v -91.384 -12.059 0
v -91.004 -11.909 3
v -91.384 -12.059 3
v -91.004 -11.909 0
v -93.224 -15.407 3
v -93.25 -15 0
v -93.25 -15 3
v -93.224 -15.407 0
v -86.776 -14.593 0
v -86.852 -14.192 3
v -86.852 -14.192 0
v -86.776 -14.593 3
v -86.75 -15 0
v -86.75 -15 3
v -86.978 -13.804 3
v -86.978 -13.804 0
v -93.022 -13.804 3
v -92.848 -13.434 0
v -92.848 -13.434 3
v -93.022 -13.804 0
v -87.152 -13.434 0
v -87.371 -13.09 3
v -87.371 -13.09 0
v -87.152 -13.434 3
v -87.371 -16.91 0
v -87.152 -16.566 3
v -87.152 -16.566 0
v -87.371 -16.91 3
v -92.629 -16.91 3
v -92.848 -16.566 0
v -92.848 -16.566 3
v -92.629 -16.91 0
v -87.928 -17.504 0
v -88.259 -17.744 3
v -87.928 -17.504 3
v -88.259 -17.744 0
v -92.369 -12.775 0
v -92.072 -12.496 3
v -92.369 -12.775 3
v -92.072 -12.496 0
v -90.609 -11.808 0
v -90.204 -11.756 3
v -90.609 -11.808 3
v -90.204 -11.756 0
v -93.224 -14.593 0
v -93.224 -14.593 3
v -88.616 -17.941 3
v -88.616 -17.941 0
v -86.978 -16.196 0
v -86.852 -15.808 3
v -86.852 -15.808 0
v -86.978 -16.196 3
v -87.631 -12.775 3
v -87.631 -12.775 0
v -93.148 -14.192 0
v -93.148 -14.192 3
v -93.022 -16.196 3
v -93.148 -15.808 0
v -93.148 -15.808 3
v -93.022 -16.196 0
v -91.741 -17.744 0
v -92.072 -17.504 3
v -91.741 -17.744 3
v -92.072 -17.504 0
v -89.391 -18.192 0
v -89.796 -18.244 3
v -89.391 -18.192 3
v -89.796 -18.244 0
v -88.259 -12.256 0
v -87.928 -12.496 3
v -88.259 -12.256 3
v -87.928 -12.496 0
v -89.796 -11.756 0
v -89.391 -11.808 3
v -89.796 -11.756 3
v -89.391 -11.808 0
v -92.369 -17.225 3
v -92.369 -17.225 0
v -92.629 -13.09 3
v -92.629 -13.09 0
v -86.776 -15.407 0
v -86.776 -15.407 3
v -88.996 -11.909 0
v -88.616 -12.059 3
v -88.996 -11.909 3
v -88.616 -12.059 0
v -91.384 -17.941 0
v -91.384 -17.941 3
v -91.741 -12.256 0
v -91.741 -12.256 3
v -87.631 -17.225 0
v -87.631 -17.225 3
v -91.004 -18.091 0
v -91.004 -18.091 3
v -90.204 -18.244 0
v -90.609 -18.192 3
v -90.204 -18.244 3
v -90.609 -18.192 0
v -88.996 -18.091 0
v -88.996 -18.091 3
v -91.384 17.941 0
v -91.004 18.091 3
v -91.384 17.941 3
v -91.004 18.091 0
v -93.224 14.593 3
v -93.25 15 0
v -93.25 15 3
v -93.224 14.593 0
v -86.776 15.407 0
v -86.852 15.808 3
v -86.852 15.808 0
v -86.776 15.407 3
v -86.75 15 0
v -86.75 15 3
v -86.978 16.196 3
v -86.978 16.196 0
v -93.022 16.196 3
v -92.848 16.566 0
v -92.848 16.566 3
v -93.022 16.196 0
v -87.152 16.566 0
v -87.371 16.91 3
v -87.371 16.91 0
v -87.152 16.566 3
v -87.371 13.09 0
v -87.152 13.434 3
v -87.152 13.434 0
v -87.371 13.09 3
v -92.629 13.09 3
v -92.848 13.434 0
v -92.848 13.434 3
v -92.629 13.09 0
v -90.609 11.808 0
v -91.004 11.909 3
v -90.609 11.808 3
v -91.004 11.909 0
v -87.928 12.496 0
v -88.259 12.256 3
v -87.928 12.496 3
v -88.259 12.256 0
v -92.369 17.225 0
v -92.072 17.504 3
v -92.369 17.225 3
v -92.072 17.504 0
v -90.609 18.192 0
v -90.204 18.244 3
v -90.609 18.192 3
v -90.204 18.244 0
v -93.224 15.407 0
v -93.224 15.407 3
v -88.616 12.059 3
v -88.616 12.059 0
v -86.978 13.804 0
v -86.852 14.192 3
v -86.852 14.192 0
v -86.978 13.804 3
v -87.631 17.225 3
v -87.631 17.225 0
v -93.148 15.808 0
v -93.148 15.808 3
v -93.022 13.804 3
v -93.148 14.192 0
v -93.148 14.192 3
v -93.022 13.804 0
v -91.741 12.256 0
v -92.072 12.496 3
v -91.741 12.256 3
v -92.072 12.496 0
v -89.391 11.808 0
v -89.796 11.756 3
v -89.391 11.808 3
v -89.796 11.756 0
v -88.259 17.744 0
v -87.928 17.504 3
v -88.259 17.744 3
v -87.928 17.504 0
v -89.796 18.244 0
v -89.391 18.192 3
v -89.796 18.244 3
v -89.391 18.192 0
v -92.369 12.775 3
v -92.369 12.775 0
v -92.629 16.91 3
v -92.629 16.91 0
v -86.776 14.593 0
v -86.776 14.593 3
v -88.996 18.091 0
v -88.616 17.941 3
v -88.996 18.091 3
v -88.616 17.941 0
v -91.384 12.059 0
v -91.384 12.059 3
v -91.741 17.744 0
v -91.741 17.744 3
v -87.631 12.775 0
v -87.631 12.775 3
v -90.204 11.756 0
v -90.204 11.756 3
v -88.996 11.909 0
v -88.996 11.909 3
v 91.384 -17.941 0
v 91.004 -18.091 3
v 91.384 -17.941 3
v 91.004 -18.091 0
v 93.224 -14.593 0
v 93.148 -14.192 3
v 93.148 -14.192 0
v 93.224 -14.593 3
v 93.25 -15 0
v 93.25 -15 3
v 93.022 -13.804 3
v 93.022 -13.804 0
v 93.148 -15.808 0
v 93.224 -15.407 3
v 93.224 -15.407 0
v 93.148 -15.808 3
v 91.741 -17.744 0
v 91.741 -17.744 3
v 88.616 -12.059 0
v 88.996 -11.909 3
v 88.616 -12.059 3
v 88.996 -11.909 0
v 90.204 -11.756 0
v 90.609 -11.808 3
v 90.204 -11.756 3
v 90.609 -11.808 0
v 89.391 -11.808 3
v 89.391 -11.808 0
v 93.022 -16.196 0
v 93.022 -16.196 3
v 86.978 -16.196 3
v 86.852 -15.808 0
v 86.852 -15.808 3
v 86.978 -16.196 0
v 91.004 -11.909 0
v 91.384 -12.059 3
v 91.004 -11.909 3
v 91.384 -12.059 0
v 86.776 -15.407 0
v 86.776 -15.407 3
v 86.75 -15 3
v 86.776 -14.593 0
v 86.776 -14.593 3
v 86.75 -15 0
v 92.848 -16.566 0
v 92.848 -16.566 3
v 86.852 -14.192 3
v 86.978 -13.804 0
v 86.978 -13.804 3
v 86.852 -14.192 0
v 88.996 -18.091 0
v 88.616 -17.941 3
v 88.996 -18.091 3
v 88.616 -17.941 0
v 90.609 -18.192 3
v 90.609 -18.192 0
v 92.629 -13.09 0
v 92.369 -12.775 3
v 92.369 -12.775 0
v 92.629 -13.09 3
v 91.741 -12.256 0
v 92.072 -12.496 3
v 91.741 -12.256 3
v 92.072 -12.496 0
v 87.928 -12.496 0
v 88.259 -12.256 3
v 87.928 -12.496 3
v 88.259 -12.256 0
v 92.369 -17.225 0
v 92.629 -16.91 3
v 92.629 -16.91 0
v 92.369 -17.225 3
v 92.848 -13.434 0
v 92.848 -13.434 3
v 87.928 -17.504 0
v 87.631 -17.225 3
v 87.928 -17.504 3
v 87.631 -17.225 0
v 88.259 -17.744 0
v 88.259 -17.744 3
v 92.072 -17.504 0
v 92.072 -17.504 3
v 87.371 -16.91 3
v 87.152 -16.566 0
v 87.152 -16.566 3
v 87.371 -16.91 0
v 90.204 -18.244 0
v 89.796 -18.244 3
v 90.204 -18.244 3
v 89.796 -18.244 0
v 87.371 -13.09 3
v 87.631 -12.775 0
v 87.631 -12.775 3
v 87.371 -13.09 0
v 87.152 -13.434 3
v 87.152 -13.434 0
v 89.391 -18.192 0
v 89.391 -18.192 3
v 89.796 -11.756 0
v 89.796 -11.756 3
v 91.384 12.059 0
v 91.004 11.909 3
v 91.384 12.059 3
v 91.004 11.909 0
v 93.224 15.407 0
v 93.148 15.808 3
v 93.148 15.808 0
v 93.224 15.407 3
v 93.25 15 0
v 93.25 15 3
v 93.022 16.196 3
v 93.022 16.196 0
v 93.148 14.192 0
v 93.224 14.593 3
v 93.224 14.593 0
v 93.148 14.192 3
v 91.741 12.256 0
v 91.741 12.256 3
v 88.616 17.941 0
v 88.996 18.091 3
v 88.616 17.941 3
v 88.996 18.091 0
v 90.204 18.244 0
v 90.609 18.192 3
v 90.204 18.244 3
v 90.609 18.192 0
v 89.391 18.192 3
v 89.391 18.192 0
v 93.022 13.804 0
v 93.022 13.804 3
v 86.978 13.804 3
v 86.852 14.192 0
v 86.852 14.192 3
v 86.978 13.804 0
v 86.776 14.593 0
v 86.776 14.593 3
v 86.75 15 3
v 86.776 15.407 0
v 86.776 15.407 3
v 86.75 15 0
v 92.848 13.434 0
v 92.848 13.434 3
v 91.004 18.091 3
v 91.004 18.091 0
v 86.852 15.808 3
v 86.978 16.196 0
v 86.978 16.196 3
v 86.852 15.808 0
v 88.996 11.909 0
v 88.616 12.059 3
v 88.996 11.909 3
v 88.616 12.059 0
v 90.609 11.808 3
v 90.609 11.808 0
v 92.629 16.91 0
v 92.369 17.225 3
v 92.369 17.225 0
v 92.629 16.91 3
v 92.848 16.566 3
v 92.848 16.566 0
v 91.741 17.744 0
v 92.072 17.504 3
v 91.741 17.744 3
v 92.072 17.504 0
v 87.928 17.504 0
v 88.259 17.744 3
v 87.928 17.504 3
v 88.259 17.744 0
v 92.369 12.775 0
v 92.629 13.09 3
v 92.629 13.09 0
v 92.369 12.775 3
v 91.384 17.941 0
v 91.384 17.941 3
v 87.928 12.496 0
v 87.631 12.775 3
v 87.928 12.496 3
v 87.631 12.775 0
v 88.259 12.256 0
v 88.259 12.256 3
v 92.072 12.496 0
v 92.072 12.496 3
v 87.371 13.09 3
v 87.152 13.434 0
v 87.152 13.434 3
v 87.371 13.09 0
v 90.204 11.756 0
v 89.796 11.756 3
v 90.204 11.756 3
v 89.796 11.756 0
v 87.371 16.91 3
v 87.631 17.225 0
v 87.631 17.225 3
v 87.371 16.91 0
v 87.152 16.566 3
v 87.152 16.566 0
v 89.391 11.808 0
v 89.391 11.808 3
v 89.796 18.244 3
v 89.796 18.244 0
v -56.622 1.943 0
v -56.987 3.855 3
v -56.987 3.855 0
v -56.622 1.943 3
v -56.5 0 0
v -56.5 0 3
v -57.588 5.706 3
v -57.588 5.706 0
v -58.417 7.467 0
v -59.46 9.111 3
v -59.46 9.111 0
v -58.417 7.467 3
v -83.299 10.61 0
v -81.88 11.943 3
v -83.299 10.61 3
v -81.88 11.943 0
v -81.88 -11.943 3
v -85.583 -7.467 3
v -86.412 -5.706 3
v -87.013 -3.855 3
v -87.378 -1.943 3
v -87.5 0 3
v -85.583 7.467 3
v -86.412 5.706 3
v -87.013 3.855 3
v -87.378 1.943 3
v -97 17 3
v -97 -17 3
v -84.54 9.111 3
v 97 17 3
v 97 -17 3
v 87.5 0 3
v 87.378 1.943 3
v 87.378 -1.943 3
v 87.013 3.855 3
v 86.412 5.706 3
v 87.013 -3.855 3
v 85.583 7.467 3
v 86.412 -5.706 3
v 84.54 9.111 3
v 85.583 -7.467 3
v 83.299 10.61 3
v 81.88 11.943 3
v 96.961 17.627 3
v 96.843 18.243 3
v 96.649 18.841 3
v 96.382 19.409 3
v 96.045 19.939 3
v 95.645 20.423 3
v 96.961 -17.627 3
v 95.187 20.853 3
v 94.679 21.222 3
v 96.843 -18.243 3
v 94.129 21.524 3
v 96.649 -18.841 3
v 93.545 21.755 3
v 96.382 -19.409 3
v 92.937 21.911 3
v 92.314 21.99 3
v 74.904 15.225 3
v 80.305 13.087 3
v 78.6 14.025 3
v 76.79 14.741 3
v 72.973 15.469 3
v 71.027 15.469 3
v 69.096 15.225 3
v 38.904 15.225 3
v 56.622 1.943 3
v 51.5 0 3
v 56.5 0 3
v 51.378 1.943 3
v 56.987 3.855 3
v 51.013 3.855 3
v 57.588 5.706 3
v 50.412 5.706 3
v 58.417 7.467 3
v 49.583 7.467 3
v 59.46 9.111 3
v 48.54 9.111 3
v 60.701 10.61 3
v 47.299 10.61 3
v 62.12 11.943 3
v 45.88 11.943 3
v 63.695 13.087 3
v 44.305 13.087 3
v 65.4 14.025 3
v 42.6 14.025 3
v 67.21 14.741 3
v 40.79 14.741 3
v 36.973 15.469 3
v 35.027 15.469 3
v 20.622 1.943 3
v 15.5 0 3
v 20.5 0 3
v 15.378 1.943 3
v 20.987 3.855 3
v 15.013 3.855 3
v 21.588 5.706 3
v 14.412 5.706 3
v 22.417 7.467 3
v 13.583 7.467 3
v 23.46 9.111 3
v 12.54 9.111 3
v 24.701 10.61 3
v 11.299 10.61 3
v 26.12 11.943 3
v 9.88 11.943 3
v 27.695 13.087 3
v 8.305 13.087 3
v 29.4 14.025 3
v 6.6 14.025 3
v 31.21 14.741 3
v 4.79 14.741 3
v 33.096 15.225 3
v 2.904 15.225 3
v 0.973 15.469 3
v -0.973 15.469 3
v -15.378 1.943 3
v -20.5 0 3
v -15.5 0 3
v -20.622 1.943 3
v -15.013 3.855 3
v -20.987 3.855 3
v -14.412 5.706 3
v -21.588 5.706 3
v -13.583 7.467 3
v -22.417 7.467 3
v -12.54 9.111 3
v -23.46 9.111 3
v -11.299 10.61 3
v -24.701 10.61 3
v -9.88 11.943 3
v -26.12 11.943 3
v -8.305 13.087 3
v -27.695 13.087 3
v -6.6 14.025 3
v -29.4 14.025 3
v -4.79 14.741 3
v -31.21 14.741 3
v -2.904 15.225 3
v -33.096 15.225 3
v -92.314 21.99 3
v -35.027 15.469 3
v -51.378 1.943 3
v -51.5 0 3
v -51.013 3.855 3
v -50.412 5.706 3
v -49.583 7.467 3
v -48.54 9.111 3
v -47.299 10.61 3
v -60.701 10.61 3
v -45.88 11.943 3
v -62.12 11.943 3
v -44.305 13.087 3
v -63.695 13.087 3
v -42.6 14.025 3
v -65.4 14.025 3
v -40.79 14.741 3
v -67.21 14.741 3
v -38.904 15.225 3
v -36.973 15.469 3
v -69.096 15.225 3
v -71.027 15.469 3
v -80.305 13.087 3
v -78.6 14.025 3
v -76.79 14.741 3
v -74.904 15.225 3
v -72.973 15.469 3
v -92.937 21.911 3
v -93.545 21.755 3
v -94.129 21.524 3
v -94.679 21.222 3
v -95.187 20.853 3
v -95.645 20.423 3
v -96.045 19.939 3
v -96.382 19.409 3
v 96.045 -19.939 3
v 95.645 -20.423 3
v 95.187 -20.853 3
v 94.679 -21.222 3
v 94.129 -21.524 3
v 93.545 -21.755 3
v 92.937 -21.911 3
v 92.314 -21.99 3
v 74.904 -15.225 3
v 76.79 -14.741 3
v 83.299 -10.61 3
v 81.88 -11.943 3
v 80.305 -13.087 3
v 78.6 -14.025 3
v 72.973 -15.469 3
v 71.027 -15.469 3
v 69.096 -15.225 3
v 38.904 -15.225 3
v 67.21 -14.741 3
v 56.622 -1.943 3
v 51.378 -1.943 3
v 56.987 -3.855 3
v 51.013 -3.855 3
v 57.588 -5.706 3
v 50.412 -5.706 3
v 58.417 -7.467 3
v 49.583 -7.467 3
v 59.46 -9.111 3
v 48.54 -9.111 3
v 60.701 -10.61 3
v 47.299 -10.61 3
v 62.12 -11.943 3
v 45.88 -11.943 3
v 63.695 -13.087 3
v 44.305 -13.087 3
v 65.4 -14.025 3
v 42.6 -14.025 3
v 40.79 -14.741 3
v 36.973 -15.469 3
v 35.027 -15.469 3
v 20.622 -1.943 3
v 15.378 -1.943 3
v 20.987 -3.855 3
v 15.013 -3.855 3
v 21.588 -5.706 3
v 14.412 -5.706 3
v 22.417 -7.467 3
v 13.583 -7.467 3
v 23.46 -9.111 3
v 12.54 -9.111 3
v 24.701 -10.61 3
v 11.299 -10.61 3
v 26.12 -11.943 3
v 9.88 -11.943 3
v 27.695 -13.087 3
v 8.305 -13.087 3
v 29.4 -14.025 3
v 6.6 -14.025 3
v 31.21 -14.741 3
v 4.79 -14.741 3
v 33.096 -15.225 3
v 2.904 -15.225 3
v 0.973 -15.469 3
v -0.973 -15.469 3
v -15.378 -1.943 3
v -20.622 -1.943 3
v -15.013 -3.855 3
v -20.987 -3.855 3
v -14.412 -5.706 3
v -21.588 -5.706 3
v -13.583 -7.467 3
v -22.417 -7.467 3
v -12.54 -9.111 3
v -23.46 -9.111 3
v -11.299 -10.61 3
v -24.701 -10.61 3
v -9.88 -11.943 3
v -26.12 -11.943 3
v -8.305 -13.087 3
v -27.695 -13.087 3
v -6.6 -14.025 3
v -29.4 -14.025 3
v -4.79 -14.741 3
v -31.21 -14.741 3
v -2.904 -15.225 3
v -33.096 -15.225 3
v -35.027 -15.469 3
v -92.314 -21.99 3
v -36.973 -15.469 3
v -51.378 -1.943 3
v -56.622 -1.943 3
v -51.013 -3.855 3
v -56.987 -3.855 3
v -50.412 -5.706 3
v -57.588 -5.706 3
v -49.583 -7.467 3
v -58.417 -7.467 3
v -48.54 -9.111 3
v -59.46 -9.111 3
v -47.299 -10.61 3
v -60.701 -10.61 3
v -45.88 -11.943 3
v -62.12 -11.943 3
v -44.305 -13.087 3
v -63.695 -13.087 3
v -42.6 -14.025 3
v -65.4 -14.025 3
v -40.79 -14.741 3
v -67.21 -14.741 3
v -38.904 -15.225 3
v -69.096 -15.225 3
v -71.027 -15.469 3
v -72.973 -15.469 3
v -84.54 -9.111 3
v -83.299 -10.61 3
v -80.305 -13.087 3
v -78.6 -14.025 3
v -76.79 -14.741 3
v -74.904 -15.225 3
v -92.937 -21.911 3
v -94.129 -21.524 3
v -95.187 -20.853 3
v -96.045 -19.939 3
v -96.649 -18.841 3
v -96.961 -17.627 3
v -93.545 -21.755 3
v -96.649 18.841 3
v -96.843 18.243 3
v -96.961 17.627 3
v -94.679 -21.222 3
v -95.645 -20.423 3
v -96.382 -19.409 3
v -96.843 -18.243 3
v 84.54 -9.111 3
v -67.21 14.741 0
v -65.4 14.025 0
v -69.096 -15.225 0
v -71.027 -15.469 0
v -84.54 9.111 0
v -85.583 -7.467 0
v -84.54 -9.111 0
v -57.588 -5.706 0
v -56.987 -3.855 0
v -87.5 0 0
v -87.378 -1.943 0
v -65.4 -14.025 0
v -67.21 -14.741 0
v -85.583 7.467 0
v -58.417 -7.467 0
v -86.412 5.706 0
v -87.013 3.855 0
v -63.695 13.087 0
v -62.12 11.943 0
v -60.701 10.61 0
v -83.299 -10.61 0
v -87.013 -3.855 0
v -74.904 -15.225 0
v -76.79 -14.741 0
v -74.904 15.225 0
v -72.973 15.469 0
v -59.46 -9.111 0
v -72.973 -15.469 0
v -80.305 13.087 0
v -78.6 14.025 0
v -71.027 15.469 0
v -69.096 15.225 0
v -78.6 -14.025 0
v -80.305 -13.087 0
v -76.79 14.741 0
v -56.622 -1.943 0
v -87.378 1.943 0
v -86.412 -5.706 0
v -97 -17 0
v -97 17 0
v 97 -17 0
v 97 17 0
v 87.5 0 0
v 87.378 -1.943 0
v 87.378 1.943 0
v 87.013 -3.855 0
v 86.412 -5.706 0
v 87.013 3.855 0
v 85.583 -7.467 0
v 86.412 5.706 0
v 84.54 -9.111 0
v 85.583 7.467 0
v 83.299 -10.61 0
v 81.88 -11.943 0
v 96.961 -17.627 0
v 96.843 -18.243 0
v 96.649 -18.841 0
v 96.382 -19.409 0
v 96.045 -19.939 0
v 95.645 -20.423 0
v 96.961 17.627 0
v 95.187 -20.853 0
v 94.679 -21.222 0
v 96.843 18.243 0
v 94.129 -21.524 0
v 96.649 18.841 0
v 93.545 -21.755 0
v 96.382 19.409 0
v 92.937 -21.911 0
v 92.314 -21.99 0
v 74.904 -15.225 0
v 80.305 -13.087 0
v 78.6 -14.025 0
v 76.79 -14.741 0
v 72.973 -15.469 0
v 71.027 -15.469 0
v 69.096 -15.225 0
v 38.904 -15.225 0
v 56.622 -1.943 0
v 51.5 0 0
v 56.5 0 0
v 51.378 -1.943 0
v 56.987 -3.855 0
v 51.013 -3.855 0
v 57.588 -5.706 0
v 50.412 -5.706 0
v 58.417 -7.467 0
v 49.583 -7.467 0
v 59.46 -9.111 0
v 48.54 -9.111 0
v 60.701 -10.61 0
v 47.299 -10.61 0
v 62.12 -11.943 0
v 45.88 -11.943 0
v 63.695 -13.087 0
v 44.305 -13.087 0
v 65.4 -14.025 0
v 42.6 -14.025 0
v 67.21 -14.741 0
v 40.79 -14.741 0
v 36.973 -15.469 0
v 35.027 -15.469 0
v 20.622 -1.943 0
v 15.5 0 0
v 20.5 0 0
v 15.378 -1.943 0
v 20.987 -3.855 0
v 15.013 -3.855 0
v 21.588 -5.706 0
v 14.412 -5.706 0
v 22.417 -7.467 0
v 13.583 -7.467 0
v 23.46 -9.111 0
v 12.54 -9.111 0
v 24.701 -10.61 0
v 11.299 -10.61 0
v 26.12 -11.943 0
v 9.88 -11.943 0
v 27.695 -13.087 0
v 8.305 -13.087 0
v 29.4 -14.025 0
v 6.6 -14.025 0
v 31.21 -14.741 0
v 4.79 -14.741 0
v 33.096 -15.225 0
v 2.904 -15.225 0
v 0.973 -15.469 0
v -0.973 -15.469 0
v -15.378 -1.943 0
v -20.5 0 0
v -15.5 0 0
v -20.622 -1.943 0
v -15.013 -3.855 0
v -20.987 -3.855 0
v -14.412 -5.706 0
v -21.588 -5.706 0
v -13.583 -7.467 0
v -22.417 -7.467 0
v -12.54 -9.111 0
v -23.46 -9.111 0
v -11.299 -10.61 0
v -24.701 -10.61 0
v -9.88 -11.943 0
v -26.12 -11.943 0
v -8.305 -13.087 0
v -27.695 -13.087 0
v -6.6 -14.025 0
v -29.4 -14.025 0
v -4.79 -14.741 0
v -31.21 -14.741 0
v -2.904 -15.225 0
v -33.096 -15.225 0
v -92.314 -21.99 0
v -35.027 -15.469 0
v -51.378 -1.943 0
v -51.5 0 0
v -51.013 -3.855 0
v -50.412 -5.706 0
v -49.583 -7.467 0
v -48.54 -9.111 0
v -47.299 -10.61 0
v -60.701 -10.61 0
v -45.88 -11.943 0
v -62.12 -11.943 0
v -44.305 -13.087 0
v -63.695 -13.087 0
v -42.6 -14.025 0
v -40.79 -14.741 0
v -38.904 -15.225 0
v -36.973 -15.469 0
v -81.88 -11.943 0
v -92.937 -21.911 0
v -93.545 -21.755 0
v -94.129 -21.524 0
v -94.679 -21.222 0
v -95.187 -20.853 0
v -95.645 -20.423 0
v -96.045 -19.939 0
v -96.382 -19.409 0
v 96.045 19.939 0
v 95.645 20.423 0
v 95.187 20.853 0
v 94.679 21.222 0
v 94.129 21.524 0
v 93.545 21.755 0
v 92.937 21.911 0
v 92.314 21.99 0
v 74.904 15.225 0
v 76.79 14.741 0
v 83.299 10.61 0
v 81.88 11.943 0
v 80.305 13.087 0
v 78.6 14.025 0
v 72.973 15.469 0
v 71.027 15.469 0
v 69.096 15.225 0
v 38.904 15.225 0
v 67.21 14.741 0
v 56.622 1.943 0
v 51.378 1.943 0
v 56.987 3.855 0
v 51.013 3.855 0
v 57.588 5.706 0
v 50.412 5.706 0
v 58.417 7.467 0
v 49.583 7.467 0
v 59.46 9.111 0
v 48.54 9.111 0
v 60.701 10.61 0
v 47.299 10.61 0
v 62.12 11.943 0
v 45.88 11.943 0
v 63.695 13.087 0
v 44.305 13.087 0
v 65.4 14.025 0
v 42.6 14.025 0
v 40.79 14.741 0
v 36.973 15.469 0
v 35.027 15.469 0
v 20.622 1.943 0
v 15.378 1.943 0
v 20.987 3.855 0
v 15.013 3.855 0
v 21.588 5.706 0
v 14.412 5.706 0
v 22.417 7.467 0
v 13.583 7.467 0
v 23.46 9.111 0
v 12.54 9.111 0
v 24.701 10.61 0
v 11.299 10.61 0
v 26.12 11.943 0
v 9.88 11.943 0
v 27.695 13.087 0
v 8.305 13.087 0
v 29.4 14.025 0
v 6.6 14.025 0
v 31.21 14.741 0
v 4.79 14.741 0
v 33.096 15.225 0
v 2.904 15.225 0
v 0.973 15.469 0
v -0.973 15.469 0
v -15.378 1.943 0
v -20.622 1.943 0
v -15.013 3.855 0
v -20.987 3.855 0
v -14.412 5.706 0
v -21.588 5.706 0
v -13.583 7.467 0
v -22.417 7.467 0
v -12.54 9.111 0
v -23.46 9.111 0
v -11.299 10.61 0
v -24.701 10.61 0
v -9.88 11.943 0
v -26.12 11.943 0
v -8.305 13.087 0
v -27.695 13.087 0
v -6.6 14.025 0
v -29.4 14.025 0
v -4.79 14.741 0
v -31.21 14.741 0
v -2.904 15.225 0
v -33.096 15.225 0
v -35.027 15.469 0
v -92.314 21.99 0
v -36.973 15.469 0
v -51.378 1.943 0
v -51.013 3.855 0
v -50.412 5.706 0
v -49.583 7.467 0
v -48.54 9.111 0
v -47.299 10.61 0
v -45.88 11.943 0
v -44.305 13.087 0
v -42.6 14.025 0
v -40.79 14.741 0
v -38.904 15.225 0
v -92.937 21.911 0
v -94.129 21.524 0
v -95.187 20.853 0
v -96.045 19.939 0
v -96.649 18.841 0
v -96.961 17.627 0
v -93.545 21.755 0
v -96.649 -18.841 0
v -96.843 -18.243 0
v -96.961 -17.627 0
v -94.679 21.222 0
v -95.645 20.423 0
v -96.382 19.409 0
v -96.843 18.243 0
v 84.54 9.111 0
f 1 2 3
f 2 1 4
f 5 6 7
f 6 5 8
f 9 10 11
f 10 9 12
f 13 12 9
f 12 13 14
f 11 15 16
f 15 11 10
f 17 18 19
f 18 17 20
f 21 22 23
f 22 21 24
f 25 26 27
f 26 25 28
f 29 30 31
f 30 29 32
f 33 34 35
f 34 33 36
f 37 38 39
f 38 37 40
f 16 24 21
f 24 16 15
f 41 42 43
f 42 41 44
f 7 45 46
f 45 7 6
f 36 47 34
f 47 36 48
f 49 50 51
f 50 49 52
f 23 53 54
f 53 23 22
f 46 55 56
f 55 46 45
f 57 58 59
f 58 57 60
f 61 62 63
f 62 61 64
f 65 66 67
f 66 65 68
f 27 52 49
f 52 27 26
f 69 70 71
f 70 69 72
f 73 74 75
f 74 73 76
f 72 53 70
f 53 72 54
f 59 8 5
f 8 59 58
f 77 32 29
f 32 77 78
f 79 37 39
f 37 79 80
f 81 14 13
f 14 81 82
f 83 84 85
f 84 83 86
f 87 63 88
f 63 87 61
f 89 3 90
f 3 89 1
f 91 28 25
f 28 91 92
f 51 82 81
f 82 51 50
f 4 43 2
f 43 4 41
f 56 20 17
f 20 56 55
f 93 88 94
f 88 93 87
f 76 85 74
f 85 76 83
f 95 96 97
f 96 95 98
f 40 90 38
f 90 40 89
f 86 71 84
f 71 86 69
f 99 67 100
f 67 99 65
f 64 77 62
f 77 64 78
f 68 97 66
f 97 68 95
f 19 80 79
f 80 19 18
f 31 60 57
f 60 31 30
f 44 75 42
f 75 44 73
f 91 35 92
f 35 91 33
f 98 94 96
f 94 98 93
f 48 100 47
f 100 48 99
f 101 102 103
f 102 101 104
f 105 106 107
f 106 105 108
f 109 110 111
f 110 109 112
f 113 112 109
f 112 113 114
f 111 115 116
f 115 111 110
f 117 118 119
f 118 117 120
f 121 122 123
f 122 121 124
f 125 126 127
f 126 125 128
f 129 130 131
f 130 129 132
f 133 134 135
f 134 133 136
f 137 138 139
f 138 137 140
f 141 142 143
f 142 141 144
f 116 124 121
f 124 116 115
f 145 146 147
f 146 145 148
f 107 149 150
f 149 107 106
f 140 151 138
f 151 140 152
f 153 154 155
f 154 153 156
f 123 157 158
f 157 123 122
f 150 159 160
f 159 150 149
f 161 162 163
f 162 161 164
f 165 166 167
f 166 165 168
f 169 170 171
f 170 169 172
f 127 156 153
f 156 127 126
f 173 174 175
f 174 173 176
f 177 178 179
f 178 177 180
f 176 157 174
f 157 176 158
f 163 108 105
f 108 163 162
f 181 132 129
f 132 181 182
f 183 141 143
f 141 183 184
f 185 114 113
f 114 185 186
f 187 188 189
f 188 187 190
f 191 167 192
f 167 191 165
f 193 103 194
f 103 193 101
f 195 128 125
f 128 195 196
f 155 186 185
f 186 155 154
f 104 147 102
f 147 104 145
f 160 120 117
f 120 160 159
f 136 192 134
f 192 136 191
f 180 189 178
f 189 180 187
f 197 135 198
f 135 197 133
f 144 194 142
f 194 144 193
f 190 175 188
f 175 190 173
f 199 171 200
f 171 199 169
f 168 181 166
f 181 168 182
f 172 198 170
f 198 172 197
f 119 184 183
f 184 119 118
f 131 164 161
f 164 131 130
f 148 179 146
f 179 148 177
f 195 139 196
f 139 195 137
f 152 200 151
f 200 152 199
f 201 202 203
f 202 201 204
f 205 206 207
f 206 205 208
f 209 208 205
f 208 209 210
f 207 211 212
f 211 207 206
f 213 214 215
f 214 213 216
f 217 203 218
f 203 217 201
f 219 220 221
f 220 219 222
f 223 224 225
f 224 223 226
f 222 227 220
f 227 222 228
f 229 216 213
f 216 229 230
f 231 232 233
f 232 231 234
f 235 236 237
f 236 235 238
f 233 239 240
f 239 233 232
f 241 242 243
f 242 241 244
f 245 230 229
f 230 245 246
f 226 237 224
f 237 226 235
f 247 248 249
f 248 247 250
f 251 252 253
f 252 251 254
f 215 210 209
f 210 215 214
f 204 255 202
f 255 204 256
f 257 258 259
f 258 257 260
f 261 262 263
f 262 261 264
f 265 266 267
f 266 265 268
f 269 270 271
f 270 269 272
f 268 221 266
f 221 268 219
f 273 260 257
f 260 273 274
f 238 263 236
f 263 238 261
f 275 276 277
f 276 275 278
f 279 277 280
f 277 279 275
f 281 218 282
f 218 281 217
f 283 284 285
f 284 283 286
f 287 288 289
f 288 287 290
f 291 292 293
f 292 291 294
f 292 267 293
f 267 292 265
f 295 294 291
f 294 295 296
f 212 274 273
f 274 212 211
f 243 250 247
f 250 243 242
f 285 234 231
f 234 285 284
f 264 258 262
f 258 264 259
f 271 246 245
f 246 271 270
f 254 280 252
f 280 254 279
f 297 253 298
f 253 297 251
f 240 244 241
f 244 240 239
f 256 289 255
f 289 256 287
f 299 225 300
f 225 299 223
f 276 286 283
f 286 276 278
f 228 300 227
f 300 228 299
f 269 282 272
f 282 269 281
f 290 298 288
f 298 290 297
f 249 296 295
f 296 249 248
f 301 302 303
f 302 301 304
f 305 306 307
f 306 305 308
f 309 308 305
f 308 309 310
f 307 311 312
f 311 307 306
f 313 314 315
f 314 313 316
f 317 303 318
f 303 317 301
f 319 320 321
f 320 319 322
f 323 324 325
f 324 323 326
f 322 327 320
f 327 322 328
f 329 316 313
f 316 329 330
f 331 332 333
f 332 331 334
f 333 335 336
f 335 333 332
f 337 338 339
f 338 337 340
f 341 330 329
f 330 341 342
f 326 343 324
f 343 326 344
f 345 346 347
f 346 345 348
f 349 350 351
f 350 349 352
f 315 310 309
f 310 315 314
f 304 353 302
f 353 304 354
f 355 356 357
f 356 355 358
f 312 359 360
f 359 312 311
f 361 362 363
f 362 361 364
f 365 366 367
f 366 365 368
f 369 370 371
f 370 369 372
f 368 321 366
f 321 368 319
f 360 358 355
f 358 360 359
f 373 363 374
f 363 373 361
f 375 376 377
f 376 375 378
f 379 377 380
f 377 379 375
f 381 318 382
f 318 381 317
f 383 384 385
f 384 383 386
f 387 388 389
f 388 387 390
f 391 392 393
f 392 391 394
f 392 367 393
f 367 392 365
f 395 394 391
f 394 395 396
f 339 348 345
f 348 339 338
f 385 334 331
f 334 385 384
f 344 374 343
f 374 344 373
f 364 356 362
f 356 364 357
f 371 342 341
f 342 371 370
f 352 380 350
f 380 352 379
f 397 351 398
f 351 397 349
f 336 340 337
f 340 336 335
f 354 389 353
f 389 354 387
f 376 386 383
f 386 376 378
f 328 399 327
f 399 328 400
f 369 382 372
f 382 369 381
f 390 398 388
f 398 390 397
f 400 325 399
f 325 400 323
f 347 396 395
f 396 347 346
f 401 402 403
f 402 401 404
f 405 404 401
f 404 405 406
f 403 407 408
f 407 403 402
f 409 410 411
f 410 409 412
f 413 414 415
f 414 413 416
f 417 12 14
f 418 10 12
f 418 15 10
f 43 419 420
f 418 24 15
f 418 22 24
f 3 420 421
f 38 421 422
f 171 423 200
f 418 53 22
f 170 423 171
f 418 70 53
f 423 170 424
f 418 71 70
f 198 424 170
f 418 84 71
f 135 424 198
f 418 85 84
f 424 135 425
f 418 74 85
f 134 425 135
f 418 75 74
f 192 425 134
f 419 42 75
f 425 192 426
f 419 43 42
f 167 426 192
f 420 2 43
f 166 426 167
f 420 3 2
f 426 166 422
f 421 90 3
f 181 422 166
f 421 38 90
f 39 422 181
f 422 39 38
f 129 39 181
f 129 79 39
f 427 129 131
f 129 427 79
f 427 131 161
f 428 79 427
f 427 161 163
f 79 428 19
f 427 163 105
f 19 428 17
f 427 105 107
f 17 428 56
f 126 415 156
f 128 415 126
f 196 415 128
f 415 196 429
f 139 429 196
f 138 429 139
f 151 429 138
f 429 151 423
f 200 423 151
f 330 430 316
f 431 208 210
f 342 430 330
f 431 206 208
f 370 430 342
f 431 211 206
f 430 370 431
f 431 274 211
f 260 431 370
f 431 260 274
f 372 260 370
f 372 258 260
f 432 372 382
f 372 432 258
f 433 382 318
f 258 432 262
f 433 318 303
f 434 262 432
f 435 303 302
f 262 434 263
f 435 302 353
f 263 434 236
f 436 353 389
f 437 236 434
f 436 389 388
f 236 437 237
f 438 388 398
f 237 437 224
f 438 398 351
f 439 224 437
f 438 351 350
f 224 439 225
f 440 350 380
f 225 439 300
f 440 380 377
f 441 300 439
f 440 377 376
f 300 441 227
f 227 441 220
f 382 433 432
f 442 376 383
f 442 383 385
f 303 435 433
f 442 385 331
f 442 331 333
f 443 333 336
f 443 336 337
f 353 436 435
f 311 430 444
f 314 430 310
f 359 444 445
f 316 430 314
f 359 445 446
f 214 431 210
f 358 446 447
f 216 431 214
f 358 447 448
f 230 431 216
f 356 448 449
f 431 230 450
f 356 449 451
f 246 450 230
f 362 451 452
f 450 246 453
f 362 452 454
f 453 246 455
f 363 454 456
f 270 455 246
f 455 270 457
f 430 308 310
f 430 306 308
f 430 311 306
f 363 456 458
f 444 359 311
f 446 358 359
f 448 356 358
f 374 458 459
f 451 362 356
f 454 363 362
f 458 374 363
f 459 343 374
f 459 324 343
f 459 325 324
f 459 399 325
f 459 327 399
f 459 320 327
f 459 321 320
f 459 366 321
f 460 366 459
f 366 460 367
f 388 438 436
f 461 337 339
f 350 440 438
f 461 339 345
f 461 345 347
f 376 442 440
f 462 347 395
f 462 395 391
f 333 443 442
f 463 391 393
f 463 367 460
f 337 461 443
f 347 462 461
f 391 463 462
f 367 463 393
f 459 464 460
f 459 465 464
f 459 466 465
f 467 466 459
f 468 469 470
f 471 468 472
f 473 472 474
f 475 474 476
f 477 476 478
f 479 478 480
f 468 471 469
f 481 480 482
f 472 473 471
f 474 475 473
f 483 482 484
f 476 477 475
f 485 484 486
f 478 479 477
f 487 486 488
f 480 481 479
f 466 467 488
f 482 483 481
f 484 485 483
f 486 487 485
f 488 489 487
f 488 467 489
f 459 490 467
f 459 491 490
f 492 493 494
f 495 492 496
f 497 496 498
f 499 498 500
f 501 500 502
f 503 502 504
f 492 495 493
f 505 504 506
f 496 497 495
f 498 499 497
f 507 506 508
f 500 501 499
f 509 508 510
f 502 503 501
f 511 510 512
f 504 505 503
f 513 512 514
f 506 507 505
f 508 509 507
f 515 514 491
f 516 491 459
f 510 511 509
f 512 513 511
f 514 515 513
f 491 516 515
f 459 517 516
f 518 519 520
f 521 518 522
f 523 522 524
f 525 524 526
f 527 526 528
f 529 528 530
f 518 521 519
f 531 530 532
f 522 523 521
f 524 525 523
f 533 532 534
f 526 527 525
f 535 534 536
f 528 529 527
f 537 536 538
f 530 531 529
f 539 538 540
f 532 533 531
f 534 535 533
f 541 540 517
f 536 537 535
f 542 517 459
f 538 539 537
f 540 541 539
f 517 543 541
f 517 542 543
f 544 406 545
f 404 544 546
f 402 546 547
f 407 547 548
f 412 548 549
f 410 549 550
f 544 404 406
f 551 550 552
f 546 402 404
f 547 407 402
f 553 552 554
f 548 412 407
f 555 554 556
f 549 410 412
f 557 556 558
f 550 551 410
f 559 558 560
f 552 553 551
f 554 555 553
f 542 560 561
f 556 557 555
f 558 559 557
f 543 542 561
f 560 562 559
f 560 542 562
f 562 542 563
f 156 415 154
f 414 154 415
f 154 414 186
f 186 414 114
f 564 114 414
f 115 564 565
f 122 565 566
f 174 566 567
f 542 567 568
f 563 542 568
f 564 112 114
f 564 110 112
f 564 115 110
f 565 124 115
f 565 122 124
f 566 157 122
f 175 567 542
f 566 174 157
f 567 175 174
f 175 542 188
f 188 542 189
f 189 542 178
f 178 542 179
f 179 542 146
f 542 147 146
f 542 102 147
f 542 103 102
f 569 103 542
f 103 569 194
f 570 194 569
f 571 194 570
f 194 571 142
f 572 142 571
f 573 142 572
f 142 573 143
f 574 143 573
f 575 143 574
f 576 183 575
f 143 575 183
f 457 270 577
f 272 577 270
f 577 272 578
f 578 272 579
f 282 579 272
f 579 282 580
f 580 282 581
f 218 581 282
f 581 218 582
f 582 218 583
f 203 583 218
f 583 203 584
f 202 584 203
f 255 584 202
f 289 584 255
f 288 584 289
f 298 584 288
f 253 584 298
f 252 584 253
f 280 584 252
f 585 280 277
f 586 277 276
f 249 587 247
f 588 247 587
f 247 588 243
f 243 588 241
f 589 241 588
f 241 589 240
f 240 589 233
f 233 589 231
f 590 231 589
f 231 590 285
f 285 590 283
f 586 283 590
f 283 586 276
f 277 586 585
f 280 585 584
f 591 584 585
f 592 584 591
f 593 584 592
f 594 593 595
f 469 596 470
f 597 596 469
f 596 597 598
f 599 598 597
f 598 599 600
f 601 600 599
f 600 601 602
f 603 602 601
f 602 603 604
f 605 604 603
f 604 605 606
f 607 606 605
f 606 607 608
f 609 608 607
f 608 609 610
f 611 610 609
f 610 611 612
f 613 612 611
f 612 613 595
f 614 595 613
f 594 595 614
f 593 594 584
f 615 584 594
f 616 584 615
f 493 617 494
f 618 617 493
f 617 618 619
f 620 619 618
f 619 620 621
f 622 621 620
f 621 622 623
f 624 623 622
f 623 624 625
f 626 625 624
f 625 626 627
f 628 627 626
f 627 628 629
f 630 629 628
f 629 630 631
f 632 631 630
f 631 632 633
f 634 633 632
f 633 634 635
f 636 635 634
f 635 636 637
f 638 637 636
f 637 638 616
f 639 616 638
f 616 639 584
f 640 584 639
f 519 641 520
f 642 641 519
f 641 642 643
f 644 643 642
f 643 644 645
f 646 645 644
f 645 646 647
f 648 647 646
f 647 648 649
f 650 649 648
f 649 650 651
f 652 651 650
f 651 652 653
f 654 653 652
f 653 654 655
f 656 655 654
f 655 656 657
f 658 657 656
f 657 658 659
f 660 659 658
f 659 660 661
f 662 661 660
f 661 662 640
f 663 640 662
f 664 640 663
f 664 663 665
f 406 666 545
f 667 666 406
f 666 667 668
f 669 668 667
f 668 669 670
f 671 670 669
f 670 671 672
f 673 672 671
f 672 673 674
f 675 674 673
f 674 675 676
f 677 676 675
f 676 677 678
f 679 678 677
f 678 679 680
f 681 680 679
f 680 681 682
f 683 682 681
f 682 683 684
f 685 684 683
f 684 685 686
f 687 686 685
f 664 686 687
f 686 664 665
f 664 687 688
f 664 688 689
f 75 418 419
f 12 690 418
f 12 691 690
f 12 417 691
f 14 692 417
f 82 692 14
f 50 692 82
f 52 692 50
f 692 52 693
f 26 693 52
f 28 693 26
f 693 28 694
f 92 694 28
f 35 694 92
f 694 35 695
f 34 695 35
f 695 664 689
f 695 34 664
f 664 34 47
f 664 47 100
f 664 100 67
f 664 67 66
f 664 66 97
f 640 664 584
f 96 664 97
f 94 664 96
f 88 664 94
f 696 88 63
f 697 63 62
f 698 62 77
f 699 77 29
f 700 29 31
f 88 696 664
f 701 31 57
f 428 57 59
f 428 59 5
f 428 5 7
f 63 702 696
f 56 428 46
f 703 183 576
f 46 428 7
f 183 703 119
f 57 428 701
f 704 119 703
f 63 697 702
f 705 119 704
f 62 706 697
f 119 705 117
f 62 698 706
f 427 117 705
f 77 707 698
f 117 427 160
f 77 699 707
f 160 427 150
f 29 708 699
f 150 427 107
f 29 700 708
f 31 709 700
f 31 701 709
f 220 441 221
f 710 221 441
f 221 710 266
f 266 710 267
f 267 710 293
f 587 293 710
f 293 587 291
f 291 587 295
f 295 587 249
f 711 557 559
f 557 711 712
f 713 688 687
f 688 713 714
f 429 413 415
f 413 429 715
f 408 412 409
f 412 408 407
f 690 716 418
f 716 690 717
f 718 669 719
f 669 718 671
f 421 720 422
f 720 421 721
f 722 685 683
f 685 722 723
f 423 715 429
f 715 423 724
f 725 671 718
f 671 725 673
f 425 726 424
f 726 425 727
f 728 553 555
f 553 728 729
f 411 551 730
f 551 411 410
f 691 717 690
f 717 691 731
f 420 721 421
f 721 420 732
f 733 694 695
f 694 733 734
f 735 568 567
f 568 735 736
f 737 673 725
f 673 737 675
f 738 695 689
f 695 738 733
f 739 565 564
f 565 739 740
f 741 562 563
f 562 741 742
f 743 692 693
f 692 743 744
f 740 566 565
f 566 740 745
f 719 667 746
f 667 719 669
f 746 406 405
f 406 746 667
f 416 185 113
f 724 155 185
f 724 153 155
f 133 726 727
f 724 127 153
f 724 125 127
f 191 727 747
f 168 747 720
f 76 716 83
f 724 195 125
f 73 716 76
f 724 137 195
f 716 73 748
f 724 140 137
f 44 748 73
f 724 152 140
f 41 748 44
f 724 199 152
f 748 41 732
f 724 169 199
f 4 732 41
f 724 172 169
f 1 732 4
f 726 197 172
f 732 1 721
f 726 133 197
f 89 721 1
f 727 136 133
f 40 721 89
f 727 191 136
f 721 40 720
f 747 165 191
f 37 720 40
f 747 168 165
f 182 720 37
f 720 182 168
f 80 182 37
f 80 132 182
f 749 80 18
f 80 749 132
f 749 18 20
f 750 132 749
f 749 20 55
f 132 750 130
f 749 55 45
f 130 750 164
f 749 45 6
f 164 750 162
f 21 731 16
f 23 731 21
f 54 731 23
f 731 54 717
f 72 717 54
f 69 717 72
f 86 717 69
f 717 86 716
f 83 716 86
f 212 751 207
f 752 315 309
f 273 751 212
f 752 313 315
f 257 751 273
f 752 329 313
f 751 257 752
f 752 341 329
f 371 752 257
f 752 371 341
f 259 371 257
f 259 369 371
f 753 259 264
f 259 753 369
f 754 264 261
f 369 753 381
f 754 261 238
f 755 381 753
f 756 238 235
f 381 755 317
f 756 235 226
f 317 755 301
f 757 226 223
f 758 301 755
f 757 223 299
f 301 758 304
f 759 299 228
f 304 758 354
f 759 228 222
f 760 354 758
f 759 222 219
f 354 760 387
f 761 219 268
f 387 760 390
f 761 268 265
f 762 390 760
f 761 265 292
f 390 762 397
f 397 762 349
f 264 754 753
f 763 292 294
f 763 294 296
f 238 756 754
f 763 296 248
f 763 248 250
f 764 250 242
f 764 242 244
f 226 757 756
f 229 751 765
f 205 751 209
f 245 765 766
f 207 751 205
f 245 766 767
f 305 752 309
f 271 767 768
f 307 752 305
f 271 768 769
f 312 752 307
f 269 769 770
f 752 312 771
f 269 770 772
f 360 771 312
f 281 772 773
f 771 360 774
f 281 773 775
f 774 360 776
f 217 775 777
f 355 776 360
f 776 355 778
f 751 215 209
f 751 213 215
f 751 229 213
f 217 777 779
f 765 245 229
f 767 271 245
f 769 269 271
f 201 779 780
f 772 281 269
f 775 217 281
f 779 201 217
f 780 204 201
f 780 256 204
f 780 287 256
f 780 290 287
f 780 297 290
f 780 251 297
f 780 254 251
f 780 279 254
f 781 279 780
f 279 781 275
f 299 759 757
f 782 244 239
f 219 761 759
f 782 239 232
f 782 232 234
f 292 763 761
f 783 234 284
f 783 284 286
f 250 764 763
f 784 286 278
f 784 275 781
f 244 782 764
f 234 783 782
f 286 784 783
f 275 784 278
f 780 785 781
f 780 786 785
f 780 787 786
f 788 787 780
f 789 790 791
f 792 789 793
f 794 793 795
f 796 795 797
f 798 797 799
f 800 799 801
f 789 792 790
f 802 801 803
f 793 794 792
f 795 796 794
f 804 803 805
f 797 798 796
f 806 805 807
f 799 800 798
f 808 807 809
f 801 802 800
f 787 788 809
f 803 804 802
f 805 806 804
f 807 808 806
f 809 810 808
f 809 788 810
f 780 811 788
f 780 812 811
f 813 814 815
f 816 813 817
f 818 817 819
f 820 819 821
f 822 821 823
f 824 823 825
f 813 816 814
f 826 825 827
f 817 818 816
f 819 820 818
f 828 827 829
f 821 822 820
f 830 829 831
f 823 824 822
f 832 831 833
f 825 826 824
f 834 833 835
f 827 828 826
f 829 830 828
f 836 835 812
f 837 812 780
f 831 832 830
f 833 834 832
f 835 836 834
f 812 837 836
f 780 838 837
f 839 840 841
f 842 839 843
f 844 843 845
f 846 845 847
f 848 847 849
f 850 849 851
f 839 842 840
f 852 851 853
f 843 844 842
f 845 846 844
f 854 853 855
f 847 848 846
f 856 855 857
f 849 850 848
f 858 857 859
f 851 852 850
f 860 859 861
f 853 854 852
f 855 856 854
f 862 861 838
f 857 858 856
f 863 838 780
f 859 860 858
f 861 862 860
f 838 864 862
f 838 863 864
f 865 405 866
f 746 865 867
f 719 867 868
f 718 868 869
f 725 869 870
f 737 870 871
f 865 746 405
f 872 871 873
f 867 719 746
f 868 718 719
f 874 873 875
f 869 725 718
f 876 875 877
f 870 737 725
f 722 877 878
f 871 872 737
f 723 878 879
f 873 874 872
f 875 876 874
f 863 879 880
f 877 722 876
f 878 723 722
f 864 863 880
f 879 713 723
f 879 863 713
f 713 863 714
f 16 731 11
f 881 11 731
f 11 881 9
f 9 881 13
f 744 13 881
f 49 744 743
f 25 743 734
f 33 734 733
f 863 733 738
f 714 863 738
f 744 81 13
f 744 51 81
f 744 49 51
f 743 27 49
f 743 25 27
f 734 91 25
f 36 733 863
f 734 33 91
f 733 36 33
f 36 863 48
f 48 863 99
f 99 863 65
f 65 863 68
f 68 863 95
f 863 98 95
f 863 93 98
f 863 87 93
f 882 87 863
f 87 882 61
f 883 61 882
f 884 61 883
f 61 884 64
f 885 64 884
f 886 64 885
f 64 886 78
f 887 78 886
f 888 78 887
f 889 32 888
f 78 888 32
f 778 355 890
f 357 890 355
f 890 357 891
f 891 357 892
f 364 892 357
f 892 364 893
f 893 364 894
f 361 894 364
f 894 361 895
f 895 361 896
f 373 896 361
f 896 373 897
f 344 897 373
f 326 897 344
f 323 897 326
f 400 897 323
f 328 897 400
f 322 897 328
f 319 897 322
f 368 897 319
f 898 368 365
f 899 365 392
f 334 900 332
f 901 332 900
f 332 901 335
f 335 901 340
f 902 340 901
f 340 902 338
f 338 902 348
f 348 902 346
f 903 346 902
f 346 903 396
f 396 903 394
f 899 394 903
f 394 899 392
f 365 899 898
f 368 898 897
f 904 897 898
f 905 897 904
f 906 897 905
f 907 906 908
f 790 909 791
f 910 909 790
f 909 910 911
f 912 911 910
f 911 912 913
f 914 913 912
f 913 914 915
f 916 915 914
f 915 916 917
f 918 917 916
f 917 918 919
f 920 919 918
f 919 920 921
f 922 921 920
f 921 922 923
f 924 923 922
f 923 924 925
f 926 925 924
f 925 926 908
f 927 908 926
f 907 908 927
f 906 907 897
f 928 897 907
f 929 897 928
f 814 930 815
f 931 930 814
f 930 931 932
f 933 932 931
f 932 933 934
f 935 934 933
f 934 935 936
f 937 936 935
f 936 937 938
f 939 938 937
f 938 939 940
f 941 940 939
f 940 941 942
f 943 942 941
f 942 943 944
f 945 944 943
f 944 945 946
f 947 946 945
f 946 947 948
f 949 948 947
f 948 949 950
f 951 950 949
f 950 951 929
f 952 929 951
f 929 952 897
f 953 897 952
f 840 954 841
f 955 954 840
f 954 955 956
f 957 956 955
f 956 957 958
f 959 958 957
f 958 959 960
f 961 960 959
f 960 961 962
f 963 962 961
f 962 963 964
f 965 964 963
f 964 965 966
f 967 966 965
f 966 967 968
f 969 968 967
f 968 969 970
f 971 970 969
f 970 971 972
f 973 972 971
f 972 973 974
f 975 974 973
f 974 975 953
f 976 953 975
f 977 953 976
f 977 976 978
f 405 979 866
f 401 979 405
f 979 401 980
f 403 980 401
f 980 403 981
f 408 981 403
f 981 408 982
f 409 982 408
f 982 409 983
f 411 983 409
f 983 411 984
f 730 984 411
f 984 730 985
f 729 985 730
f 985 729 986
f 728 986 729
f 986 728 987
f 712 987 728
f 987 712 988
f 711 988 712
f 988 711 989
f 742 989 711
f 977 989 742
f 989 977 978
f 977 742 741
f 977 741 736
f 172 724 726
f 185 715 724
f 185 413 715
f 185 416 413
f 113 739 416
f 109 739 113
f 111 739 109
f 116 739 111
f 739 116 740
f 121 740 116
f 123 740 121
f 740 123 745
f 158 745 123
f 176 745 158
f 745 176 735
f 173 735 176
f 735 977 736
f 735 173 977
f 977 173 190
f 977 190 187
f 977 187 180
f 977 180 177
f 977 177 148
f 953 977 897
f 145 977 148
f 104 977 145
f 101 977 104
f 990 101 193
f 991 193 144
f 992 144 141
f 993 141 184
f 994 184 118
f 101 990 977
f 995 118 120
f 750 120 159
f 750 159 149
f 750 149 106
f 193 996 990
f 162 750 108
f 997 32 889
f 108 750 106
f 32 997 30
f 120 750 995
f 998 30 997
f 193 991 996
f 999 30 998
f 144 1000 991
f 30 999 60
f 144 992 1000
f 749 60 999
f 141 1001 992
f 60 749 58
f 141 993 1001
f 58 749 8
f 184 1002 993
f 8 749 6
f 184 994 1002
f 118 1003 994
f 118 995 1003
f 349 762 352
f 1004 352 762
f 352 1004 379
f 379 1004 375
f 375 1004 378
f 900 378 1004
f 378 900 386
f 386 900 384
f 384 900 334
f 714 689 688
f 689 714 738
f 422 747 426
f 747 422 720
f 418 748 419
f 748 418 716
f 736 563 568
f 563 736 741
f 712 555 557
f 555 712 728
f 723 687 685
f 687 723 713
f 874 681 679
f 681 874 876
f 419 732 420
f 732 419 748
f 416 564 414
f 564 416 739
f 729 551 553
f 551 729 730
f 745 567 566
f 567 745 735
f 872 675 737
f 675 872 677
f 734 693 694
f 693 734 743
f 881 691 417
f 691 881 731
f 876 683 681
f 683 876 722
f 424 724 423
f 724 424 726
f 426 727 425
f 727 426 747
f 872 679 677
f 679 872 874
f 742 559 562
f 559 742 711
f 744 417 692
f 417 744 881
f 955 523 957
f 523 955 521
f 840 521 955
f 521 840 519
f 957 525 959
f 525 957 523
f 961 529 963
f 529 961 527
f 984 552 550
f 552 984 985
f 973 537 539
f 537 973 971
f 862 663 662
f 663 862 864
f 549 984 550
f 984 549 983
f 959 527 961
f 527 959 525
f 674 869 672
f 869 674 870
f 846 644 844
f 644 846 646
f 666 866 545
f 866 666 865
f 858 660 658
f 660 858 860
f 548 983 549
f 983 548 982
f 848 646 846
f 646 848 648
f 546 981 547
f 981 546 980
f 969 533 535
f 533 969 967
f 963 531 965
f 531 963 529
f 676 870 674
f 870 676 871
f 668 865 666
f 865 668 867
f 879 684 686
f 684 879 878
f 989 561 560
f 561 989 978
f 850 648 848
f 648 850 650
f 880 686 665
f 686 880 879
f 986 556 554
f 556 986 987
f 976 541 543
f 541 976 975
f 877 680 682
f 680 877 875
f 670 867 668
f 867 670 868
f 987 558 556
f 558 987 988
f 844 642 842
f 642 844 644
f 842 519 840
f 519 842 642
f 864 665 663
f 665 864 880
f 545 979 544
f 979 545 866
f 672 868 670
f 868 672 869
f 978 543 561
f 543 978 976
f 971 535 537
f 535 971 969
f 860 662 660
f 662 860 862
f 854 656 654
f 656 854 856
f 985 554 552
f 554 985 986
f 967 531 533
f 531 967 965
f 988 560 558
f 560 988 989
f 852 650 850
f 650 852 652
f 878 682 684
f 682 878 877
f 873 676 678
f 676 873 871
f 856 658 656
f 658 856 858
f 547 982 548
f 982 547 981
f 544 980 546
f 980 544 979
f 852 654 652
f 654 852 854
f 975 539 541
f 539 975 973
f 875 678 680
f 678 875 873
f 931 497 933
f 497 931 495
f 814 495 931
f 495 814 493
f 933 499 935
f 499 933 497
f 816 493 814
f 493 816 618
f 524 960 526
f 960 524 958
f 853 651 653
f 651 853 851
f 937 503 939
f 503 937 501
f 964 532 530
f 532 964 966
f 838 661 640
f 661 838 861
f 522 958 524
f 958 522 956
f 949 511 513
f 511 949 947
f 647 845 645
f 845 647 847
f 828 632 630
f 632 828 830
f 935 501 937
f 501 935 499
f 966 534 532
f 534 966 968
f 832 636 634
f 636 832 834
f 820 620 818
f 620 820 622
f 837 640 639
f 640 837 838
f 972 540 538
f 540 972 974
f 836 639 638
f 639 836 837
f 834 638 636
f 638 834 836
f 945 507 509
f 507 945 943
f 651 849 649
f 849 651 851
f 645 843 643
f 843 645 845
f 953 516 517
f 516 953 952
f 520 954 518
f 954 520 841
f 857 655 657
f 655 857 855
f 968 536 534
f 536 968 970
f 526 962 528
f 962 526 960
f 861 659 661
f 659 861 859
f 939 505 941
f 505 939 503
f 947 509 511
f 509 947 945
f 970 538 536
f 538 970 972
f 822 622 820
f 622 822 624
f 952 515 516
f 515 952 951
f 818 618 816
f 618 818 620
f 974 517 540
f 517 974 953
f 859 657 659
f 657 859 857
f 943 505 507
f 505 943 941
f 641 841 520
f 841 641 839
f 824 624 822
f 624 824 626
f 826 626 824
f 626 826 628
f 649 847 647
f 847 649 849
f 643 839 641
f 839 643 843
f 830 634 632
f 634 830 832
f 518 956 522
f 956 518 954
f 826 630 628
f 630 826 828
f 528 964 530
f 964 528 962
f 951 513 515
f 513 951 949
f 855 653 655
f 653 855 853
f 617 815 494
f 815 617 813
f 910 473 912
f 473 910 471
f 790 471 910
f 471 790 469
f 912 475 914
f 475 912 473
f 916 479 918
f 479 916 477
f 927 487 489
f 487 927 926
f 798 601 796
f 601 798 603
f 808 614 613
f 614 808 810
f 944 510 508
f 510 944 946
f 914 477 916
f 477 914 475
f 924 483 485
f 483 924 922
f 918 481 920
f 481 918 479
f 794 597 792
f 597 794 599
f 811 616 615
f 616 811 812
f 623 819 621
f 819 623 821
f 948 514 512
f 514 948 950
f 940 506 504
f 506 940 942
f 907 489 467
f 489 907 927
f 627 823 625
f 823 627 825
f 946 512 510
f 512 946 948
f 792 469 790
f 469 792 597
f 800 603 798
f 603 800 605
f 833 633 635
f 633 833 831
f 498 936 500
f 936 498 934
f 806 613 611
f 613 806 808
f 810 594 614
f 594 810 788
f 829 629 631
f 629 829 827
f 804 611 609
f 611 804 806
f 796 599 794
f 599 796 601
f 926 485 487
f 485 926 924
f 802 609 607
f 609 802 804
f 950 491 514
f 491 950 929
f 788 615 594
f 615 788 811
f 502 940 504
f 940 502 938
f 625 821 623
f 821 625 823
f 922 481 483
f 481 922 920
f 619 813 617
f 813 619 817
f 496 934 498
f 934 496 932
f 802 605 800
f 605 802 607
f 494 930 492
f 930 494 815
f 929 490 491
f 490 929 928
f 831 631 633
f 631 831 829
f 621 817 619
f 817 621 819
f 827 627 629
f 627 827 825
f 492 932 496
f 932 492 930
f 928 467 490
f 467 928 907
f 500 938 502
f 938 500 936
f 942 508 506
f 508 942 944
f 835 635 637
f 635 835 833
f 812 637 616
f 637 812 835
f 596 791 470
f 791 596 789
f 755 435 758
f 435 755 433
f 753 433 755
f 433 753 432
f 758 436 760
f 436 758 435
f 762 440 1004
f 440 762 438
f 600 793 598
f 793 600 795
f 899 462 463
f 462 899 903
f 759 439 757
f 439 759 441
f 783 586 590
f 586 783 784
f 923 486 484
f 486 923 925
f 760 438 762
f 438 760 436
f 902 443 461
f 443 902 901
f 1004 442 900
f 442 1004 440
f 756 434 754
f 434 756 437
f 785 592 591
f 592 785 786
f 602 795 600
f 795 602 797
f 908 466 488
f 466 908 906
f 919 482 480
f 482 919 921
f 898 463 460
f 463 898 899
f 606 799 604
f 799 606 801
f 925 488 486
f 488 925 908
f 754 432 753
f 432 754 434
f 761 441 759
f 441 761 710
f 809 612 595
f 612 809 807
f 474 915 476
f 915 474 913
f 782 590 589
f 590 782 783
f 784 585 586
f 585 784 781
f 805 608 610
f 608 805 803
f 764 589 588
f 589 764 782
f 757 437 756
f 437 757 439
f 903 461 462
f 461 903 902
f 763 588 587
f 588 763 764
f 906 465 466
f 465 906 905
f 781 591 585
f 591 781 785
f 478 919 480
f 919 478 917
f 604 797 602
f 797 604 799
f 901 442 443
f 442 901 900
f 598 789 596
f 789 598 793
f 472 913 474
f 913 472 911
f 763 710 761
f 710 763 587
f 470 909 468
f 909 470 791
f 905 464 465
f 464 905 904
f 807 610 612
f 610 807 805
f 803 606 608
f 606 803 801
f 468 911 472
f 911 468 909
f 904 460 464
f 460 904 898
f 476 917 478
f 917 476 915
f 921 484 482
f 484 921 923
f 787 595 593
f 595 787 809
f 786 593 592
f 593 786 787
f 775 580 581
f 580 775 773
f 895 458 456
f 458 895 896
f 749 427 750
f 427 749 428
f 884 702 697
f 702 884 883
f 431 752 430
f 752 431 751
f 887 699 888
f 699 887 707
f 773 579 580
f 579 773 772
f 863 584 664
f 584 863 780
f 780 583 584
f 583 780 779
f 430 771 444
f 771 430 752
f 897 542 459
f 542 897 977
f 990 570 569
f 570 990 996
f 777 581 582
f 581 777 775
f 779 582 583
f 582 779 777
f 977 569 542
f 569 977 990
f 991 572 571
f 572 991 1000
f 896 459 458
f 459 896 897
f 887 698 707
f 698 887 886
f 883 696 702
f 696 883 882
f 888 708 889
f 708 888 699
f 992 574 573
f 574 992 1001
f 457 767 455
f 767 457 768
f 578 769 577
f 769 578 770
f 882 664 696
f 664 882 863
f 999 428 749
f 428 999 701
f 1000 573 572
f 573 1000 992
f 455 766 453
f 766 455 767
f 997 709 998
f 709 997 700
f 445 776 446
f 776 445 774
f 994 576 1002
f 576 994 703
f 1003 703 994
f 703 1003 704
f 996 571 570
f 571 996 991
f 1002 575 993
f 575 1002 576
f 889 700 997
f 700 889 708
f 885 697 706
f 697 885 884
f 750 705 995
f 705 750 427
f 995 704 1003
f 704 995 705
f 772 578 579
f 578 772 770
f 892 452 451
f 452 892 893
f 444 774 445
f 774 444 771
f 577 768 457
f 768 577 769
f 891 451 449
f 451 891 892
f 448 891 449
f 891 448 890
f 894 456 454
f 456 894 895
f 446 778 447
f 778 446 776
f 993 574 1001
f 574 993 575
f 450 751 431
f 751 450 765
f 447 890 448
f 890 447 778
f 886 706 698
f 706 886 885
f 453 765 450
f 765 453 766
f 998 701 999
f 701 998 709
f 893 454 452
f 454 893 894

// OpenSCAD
$fn = 50;


difference() {
	union() {
		hull() {
			translate(v = [-92.0000000000, 17.0000000000, 0]) {
				cylinder(h = 3, r = 5);
			}
			translate(v = [92.0000000000, 17.0000000000, 0]) {
				cylinder(h = 3, r = 5);
			}
			translate(v = [-92.0000000000, -17.0000000000, 0]) {
				cylinder(h = 3, r = 5);
			}
			translate(v = [92.0000000000, -17.0000000000, 0]) {
				cylinder(h = 3, r = 5);
			}
		}
	}
	union() {
		#translate(v = [-90.0000000000, -15.0000000000, -100.0000000000]) {
			cylinder(h = 200, r = 3.2500000000);
		}
		#translate(v = [-90.0000000000, 15.0000000000, -100.0000000000]) {
			cylinder(h = 200, r = 3.2500000000);
		}
		#translate(v = [90.0000000000, -15.0000000000, -100.0000000000]) {
			cylinder(h = 200, r = 3.2500000000);
		}
		#translate(v = [90.0000000000, 15.0000000000, -100.0000000000]) {
			cylinder(h = 200, r = 3.2500000000);
		}
		#translate(v = [-72.0000000000, 0, 0]) {
			cylinder(h = 3, r = 15.5000000000);
		}
		#translate(v = [-36.0000000000, 0, 0]) {
			cylinder(h = 3, r = 15.5000000000);
		}
		#cylinder(h = 3, r = 15.5000000000);
		#translate(v = [36.0000000000, 0, 0]) {
			cylinder(h = 3, r = 15.5000000000);
		}
		#translate(v = [72.0000000000, 0, 0]) {
			cylinder(h = 3, r = 15.5000000000);
		}
	}
}
